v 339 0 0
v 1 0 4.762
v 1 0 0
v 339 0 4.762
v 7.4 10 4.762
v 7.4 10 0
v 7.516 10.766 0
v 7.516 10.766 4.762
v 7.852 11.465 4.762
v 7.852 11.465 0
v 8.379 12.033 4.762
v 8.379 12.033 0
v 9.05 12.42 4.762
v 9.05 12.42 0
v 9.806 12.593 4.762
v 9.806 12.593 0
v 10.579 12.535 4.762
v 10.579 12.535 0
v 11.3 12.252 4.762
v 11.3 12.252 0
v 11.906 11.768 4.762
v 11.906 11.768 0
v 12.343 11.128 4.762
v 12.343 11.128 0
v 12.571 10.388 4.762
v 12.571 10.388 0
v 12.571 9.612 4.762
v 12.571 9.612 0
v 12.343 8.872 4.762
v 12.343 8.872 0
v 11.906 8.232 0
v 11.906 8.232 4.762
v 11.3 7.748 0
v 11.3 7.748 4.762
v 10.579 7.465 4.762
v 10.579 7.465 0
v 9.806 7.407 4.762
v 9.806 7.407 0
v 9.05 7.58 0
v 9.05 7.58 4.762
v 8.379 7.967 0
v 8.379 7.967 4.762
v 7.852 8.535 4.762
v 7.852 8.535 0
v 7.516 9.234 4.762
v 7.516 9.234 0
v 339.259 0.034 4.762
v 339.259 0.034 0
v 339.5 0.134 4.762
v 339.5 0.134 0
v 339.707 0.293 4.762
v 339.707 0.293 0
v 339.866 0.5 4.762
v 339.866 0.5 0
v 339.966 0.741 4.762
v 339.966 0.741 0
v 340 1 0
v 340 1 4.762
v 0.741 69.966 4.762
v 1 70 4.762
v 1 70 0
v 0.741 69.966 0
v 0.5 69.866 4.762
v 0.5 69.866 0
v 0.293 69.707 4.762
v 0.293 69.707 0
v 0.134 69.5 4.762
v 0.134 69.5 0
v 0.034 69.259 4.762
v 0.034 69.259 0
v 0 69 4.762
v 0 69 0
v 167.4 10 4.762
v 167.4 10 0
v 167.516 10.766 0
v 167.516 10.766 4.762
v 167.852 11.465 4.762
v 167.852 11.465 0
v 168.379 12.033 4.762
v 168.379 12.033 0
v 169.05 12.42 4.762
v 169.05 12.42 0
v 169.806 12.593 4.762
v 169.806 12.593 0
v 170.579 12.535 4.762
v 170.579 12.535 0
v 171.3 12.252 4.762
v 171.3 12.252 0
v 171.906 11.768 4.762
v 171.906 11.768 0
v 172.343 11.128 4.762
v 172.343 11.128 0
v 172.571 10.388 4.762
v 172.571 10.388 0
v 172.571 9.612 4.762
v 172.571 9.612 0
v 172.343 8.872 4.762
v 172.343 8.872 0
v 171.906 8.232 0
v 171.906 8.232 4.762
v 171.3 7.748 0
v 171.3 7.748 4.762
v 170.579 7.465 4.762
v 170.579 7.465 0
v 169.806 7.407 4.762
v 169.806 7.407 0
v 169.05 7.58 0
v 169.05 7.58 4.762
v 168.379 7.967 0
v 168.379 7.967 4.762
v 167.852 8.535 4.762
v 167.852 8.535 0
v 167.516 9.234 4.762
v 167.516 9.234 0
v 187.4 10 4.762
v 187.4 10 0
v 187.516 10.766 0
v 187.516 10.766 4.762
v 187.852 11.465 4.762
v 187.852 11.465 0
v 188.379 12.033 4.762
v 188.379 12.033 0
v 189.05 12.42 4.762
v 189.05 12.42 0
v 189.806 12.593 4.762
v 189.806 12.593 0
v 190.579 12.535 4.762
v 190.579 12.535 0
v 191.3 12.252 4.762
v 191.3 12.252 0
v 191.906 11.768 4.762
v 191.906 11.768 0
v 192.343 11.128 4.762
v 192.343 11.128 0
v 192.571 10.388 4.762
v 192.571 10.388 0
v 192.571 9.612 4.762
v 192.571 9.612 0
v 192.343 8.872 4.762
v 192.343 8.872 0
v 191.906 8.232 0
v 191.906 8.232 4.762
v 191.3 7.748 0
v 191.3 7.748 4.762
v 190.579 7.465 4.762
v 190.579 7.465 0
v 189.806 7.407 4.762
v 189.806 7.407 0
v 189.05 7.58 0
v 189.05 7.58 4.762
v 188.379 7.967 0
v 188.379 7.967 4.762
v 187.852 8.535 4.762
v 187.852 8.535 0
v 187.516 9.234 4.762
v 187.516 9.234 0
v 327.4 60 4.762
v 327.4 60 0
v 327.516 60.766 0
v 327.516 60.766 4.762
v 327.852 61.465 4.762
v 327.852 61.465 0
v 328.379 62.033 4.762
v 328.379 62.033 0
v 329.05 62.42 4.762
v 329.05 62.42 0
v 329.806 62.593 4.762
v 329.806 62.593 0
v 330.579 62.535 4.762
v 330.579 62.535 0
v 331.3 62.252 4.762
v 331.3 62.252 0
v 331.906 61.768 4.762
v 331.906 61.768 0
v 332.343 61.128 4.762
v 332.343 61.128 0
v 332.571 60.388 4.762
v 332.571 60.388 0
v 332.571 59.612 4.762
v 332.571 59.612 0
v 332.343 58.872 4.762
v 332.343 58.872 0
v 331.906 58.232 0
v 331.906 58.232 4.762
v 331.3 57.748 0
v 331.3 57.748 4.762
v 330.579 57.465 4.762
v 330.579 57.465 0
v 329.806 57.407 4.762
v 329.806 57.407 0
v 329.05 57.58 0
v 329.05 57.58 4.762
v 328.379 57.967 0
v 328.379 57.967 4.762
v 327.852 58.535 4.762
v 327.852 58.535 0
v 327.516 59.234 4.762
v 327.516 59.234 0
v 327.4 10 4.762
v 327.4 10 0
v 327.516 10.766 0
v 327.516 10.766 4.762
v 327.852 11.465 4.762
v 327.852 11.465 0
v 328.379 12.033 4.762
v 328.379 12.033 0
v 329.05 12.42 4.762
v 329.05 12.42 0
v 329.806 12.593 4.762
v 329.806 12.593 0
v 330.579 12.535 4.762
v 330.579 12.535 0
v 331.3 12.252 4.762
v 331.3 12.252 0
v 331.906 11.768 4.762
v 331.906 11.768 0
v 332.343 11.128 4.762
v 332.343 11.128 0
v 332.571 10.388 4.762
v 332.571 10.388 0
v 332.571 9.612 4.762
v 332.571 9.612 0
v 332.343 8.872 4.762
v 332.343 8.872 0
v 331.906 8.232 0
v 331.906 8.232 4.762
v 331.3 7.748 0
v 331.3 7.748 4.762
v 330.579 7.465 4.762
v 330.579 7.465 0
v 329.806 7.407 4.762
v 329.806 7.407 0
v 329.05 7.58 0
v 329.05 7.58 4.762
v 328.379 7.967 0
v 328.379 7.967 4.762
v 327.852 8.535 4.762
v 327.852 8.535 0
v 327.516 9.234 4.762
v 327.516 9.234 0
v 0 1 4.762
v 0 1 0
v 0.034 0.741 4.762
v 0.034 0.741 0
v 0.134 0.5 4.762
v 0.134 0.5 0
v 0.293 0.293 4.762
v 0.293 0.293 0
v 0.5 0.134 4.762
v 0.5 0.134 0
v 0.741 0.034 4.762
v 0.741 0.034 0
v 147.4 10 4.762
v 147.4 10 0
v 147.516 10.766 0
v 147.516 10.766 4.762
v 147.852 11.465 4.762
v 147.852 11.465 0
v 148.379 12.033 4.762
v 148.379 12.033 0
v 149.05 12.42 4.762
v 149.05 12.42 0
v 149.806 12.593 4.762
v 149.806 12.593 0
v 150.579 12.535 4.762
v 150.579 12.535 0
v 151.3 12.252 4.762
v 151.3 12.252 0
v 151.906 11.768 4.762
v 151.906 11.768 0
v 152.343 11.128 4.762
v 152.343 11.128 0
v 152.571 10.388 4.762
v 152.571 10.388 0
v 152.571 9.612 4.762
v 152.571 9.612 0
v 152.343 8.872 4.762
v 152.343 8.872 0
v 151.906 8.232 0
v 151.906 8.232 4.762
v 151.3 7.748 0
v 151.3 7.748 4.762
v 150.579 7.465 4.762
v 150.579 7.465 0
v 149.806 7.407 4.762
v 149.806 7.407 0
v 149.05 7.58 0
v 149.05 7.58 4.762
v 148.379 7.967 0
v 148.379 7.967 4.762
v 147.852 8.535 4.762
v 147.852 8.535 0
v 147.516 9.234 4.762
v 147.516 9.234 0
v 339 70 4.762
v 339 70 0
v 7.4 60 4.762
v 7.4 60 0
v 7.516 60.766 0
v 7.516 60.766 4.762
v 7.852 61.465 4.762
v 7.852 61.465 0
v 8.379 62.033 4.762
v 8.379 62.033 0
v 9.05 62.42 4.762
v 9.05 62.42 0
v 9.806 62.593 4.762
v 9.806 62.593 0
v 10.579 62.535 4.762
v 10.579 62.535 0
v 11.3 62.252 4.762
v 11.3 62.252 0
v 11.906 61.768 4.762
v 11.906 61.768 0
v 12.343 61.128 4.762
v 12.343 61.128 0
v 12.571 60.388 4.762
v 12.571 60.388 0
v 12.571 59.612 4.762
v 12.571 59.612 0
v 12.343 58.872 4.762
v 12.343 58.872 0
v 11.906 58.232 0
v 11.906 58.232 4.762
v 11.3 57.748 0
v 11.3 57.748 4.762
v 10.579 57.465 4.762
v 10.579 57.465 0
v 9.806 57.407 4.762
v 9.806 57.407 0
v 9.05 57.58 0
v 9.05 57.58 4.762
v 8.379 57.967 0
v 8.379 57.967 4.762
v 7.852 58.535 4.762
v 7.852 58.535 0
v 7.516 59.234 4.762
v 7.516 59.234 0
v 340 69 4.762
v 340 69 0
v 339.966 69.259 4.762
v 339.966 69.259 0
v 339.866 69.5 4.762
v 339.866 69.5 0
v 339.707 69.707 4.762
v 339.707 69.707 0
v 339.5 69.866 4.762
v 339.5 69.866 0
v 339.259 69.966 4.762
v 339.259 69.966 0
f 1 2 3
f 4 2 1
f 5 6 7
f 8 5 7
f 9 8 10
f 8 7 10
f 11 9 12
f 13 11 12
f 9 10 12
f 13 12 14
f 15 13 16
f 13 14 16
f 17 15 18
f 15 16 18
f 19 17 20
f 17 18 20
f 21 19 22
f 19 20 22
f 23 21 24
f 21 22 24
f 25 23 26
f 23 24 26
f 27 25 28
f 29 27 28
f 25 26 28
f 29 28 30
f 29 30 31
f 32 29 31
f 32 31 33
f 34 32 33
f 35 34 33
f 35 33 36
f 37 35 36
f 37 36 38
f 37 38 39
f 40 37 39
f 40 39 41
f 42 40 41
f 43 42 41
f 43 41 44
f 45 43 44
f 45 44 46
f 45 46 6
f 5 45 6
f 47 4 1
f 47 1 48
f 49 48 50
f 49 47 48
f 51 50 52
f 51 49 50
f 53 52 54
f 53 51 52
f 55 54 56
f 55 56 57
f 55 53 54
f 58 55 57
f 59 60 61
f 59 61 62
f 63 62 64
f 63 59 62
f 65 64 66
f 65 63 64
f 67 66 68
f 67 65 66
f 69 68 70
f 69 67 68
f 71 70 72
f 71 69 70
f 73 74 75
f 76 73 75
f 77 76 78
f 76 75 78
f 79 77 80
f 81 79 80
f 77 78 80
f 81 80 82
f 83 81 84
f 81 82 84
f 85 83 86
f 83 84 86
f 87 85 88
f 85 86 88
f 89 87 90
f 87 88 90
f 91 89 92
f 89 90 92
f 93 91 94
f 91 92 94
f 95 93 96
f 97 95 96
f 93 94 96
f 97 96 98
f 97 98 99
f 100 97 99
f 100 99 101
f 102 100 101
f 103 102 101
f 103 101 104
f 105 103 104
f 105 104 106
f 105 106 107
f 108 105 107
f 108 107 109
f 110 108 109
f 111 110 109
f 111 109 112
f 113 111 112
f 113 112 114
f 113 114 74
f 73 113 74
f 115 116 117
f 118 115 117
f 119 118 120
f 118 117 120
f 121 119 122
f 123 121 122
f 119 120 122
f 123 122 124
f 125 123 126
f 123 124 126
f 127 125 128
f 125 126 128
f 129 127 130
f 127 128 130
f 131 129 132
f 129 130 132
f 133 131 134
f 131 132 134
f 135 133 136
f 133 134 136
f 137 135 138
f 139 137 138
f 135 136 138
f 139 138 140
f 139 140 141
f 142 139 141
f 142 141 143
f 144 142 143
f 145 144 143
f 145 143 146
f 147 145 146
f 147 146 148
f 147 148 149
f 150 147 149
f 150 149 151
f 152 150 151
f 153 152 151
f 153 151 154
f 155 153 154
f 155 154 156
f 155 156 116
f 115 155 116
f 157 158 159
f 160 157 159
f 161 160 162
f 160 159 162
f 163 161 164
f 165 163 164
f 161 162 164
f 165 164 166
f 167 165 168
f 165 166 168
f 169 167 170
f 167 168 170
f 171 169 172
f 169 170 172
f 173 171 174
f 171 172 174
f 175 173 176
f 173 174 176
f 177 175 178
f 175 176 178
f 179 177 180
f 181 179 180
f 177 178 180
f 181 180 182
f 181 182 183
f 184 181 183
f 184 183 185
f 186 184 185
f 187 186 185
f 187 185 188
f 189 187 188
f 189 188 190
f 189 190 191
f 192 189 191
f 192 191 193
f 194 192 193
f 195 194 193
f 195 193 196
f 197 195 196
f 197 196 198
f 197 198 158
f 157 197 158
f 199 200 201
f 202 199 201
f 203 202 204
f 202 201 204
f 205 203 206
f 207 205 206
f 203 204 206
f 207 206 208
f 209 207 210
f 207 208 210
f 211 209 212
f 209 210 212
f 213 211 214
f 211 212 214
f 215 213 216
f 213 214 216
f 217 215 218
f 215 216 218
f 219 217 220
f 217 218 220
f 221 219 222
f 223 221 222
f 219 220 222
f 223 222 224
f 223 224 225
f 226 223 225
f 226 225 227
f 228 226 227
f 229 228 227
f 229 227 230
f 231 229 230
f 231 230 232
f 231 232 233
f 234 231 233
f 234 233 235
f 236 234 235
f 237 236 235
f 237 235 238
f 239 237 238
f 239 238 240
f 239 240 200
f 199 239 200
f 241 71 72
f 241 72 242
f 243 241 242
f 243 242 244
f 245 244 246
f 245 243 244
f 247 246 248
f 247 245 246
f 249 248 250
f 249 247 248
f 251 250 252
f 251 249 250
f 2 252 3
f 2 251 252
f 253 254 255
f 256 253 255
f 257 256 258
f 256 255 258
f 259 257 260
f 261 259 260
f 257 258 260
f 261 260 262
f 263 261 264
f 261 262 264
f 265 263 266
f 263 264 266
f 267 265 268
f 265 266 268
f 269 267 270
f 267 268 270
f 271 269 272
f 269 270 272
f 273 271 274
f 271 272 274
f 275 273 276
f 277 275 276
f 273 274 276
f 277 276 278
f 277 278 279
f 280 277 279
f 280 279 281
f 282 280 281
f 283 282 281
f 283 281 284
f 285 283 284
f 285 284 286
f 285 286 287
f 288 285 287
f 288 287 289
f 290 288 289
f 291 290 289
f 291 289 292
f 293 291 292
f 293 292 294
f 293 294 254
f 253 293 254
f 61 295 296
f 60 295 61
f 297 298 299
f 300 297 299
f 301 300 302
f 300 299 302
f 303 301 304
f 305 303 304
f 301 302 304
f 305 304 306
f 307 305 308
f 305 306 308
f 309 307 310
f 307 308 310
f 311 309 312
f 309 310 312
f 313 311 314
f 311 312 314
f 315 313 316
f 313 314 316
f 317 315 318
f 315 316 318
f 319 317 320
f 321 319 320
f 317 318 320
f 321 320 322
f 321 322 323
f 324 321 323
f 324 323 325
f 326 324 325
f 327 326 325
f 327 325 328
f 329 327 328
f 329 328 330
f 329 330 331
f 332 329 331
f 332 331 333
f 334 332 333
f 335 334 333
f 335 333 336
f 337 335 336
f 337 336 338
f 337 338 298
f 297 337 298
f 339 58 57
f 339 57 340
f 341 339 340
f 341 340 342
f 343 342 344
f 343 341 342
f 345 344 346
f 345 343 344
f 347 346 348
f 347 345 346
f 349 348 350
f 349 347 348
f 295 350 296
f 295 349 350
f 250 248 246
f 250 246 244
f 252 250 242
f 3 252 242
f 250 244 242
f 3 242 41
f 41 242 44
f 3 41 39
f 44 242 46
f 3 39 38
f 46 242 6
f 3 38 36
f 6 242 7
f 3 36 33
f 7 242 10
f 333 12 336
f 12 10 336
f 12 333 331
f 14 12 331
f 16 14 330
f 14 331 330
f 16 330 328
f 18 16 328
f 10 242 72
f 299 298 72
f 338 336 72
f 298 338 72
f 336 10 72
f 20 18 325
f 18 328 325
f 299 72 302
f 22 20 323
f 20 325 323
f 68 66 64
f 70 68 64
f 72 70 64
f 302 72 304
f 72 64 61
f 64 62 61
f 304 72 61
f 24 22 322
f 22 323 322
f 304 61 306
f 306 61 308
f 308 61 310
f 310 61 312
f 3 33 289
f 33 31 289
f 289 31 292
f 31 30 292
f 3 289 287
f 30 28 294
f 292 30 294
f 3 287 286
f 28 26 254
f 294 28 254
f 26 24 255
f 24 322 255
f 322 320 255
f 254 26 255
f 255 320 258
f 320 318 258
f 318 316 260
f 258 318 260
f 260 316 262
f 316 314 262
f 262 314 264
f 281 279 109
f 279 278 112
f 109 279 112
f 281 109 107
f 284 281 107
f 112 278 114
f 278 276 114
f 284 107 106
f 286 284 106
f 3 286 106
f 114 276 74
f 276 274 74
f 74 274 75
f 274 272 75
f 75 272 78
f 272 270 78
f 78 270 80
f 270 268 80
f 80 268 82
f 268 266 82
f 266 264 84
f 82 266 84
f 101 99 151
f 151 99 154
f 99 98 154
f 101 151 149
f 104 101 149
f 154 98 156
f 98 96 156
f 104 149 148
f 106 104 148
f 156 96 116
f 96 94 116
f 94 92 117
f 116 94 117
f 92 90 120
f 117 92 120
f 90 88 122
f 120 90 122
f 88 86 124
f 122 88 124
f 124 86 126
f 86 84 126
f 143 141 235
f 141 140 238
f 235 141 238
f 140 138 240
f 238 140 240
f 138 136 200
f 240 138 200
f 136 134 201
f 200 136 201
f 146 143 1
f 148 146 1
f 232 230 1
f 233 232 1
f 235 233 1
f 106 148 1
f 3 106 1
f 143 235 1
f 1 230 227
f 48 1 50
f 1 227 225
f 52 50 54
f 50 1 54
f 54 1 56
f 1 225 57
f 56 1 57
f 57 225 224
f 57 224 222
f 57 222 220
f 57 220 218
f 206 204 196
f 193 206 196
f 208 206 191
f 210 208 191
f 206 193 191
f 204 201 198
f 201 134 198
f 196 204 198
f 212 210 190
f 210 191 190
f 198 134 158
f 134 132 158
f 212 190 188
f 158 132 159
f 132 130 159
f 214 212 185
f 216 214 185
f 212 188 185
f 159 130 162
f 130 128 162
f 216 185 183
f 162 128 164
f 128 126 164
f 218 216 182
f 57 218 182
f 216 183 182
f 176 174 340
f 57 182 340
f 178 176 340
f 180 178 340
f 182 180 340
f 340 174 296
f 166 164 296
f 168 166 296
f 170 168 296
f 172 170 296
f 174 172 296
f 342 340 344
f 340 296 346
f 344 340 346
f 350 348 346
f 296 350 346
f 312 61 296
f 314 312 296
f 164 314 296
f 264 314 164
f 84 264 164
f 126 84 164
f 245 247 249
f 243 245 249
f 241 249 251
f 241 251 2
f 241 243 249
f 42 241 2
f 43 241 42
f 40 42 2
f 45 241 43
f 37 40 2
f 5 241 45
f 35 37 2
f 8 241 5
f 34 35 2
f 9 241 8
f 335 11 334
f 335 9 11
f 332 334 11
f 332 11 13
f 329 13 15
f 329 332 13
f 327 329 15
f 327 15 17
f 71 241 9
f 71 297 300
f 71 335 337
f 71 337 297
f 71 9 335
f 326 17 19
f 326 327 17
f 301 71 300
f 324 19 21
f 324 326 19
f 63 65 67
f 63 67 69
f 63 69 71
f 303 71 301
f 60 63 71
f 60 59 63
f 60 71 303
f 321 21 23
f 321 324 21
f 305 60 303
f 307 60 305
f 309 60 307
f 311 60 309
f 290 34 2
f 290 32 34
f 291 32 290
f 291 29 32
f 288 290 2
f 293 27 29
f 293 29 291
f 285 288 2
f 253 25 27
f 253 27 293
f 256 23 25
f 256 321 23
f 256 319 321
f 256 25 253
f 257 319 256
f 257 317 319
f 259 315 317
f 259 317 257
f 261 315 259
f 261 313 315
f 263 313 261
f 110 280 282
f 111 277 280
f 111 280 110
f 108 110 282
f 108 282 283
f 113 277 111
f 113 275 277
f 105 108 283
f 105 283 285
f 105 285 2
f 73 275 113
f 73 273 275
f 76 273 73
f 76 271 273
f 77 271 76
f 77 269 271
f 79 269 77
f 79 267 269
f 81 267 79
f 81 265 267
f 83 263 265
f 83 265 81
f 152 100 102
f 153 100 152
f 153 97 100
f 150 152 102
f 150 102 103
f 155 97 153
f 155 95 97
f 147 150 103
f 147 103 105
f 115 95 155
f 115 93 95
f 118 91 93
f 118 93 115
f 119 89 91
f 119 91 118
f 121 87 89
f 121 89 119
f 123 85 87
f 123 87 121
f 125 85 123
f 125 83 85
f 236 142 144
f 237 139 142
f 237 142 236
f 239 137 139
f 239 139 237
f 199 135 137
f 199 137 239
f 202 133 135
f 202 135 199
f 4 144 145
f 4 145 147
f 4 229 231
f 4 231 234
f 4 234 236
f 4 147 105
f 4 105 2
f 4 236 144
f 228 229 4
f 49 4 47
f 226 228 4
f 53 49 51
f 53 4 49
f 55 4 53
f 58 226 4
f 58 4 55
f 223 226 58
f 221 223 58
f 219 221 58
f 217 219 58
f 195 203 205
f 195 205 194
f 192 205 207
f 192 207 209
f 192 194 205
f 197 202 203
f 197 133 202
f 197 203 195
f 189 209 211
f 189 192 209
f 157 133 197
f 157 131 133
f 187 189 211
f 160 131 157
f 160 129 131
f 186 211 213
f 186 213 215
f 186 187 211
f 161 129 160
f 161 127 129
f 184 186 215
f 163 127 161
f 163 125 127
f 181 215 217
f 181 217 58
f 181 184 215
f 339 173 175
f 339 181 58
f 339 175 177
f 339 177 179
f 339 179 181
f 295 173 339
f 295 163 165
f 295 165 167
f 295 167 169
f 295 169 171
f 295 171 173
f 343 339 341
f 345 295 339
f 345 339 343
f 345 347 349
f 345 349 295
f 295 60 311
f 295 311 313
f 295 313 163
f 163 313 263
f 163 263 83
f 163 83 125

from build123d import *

# Parameters (mm, degrees)
BASE_FLANGE1_DEPTH         = 4.7625
F_5_2_5_2_DIAMETER_HOLE1_D = 5.2


# Sheet-metal steps are written as plain solids
with BuildPart() as part:
    # Sketch11 → Base-Flange1 (new body)
    with BuildSketch(Plane.XY.offset(4.7625)):
        with BuildLine():
            Line((0, 69), (0, 1))
            ThreePointArc((0, 1), (0.292893219, 0.292893219), (1, 0))
            Line((1, 0), (339, 0))
            ThreePointArc((339, 0), (339.707106781, 0.292893219), (340, 1))
            Line((340, 1), (340, 69))
            ThreePointArc((340, 69), (339.707106781, 69.707106781), (339, 70))
            Line((339, 70), (1, 70))
            ThreePointArc((1, 70), (0.292893219, 69.707106781), (0, 69))
        make_face()
    extrude(amount=-BASE_FLANGE1_DEPTH)

    # Ø5.2 (5.2) Diameter Hole1 (through all)
    with Locations(Plane.XY.offset(4.7625)):
        with Locations((190, 10), (170, 10), (330, 60), (10, 10), (10, 60), (330, 10), (150, 10)):
            Hole(F_5_2_5_2_DIAMETER_HOLE1_D / 2)


solid = part.part
